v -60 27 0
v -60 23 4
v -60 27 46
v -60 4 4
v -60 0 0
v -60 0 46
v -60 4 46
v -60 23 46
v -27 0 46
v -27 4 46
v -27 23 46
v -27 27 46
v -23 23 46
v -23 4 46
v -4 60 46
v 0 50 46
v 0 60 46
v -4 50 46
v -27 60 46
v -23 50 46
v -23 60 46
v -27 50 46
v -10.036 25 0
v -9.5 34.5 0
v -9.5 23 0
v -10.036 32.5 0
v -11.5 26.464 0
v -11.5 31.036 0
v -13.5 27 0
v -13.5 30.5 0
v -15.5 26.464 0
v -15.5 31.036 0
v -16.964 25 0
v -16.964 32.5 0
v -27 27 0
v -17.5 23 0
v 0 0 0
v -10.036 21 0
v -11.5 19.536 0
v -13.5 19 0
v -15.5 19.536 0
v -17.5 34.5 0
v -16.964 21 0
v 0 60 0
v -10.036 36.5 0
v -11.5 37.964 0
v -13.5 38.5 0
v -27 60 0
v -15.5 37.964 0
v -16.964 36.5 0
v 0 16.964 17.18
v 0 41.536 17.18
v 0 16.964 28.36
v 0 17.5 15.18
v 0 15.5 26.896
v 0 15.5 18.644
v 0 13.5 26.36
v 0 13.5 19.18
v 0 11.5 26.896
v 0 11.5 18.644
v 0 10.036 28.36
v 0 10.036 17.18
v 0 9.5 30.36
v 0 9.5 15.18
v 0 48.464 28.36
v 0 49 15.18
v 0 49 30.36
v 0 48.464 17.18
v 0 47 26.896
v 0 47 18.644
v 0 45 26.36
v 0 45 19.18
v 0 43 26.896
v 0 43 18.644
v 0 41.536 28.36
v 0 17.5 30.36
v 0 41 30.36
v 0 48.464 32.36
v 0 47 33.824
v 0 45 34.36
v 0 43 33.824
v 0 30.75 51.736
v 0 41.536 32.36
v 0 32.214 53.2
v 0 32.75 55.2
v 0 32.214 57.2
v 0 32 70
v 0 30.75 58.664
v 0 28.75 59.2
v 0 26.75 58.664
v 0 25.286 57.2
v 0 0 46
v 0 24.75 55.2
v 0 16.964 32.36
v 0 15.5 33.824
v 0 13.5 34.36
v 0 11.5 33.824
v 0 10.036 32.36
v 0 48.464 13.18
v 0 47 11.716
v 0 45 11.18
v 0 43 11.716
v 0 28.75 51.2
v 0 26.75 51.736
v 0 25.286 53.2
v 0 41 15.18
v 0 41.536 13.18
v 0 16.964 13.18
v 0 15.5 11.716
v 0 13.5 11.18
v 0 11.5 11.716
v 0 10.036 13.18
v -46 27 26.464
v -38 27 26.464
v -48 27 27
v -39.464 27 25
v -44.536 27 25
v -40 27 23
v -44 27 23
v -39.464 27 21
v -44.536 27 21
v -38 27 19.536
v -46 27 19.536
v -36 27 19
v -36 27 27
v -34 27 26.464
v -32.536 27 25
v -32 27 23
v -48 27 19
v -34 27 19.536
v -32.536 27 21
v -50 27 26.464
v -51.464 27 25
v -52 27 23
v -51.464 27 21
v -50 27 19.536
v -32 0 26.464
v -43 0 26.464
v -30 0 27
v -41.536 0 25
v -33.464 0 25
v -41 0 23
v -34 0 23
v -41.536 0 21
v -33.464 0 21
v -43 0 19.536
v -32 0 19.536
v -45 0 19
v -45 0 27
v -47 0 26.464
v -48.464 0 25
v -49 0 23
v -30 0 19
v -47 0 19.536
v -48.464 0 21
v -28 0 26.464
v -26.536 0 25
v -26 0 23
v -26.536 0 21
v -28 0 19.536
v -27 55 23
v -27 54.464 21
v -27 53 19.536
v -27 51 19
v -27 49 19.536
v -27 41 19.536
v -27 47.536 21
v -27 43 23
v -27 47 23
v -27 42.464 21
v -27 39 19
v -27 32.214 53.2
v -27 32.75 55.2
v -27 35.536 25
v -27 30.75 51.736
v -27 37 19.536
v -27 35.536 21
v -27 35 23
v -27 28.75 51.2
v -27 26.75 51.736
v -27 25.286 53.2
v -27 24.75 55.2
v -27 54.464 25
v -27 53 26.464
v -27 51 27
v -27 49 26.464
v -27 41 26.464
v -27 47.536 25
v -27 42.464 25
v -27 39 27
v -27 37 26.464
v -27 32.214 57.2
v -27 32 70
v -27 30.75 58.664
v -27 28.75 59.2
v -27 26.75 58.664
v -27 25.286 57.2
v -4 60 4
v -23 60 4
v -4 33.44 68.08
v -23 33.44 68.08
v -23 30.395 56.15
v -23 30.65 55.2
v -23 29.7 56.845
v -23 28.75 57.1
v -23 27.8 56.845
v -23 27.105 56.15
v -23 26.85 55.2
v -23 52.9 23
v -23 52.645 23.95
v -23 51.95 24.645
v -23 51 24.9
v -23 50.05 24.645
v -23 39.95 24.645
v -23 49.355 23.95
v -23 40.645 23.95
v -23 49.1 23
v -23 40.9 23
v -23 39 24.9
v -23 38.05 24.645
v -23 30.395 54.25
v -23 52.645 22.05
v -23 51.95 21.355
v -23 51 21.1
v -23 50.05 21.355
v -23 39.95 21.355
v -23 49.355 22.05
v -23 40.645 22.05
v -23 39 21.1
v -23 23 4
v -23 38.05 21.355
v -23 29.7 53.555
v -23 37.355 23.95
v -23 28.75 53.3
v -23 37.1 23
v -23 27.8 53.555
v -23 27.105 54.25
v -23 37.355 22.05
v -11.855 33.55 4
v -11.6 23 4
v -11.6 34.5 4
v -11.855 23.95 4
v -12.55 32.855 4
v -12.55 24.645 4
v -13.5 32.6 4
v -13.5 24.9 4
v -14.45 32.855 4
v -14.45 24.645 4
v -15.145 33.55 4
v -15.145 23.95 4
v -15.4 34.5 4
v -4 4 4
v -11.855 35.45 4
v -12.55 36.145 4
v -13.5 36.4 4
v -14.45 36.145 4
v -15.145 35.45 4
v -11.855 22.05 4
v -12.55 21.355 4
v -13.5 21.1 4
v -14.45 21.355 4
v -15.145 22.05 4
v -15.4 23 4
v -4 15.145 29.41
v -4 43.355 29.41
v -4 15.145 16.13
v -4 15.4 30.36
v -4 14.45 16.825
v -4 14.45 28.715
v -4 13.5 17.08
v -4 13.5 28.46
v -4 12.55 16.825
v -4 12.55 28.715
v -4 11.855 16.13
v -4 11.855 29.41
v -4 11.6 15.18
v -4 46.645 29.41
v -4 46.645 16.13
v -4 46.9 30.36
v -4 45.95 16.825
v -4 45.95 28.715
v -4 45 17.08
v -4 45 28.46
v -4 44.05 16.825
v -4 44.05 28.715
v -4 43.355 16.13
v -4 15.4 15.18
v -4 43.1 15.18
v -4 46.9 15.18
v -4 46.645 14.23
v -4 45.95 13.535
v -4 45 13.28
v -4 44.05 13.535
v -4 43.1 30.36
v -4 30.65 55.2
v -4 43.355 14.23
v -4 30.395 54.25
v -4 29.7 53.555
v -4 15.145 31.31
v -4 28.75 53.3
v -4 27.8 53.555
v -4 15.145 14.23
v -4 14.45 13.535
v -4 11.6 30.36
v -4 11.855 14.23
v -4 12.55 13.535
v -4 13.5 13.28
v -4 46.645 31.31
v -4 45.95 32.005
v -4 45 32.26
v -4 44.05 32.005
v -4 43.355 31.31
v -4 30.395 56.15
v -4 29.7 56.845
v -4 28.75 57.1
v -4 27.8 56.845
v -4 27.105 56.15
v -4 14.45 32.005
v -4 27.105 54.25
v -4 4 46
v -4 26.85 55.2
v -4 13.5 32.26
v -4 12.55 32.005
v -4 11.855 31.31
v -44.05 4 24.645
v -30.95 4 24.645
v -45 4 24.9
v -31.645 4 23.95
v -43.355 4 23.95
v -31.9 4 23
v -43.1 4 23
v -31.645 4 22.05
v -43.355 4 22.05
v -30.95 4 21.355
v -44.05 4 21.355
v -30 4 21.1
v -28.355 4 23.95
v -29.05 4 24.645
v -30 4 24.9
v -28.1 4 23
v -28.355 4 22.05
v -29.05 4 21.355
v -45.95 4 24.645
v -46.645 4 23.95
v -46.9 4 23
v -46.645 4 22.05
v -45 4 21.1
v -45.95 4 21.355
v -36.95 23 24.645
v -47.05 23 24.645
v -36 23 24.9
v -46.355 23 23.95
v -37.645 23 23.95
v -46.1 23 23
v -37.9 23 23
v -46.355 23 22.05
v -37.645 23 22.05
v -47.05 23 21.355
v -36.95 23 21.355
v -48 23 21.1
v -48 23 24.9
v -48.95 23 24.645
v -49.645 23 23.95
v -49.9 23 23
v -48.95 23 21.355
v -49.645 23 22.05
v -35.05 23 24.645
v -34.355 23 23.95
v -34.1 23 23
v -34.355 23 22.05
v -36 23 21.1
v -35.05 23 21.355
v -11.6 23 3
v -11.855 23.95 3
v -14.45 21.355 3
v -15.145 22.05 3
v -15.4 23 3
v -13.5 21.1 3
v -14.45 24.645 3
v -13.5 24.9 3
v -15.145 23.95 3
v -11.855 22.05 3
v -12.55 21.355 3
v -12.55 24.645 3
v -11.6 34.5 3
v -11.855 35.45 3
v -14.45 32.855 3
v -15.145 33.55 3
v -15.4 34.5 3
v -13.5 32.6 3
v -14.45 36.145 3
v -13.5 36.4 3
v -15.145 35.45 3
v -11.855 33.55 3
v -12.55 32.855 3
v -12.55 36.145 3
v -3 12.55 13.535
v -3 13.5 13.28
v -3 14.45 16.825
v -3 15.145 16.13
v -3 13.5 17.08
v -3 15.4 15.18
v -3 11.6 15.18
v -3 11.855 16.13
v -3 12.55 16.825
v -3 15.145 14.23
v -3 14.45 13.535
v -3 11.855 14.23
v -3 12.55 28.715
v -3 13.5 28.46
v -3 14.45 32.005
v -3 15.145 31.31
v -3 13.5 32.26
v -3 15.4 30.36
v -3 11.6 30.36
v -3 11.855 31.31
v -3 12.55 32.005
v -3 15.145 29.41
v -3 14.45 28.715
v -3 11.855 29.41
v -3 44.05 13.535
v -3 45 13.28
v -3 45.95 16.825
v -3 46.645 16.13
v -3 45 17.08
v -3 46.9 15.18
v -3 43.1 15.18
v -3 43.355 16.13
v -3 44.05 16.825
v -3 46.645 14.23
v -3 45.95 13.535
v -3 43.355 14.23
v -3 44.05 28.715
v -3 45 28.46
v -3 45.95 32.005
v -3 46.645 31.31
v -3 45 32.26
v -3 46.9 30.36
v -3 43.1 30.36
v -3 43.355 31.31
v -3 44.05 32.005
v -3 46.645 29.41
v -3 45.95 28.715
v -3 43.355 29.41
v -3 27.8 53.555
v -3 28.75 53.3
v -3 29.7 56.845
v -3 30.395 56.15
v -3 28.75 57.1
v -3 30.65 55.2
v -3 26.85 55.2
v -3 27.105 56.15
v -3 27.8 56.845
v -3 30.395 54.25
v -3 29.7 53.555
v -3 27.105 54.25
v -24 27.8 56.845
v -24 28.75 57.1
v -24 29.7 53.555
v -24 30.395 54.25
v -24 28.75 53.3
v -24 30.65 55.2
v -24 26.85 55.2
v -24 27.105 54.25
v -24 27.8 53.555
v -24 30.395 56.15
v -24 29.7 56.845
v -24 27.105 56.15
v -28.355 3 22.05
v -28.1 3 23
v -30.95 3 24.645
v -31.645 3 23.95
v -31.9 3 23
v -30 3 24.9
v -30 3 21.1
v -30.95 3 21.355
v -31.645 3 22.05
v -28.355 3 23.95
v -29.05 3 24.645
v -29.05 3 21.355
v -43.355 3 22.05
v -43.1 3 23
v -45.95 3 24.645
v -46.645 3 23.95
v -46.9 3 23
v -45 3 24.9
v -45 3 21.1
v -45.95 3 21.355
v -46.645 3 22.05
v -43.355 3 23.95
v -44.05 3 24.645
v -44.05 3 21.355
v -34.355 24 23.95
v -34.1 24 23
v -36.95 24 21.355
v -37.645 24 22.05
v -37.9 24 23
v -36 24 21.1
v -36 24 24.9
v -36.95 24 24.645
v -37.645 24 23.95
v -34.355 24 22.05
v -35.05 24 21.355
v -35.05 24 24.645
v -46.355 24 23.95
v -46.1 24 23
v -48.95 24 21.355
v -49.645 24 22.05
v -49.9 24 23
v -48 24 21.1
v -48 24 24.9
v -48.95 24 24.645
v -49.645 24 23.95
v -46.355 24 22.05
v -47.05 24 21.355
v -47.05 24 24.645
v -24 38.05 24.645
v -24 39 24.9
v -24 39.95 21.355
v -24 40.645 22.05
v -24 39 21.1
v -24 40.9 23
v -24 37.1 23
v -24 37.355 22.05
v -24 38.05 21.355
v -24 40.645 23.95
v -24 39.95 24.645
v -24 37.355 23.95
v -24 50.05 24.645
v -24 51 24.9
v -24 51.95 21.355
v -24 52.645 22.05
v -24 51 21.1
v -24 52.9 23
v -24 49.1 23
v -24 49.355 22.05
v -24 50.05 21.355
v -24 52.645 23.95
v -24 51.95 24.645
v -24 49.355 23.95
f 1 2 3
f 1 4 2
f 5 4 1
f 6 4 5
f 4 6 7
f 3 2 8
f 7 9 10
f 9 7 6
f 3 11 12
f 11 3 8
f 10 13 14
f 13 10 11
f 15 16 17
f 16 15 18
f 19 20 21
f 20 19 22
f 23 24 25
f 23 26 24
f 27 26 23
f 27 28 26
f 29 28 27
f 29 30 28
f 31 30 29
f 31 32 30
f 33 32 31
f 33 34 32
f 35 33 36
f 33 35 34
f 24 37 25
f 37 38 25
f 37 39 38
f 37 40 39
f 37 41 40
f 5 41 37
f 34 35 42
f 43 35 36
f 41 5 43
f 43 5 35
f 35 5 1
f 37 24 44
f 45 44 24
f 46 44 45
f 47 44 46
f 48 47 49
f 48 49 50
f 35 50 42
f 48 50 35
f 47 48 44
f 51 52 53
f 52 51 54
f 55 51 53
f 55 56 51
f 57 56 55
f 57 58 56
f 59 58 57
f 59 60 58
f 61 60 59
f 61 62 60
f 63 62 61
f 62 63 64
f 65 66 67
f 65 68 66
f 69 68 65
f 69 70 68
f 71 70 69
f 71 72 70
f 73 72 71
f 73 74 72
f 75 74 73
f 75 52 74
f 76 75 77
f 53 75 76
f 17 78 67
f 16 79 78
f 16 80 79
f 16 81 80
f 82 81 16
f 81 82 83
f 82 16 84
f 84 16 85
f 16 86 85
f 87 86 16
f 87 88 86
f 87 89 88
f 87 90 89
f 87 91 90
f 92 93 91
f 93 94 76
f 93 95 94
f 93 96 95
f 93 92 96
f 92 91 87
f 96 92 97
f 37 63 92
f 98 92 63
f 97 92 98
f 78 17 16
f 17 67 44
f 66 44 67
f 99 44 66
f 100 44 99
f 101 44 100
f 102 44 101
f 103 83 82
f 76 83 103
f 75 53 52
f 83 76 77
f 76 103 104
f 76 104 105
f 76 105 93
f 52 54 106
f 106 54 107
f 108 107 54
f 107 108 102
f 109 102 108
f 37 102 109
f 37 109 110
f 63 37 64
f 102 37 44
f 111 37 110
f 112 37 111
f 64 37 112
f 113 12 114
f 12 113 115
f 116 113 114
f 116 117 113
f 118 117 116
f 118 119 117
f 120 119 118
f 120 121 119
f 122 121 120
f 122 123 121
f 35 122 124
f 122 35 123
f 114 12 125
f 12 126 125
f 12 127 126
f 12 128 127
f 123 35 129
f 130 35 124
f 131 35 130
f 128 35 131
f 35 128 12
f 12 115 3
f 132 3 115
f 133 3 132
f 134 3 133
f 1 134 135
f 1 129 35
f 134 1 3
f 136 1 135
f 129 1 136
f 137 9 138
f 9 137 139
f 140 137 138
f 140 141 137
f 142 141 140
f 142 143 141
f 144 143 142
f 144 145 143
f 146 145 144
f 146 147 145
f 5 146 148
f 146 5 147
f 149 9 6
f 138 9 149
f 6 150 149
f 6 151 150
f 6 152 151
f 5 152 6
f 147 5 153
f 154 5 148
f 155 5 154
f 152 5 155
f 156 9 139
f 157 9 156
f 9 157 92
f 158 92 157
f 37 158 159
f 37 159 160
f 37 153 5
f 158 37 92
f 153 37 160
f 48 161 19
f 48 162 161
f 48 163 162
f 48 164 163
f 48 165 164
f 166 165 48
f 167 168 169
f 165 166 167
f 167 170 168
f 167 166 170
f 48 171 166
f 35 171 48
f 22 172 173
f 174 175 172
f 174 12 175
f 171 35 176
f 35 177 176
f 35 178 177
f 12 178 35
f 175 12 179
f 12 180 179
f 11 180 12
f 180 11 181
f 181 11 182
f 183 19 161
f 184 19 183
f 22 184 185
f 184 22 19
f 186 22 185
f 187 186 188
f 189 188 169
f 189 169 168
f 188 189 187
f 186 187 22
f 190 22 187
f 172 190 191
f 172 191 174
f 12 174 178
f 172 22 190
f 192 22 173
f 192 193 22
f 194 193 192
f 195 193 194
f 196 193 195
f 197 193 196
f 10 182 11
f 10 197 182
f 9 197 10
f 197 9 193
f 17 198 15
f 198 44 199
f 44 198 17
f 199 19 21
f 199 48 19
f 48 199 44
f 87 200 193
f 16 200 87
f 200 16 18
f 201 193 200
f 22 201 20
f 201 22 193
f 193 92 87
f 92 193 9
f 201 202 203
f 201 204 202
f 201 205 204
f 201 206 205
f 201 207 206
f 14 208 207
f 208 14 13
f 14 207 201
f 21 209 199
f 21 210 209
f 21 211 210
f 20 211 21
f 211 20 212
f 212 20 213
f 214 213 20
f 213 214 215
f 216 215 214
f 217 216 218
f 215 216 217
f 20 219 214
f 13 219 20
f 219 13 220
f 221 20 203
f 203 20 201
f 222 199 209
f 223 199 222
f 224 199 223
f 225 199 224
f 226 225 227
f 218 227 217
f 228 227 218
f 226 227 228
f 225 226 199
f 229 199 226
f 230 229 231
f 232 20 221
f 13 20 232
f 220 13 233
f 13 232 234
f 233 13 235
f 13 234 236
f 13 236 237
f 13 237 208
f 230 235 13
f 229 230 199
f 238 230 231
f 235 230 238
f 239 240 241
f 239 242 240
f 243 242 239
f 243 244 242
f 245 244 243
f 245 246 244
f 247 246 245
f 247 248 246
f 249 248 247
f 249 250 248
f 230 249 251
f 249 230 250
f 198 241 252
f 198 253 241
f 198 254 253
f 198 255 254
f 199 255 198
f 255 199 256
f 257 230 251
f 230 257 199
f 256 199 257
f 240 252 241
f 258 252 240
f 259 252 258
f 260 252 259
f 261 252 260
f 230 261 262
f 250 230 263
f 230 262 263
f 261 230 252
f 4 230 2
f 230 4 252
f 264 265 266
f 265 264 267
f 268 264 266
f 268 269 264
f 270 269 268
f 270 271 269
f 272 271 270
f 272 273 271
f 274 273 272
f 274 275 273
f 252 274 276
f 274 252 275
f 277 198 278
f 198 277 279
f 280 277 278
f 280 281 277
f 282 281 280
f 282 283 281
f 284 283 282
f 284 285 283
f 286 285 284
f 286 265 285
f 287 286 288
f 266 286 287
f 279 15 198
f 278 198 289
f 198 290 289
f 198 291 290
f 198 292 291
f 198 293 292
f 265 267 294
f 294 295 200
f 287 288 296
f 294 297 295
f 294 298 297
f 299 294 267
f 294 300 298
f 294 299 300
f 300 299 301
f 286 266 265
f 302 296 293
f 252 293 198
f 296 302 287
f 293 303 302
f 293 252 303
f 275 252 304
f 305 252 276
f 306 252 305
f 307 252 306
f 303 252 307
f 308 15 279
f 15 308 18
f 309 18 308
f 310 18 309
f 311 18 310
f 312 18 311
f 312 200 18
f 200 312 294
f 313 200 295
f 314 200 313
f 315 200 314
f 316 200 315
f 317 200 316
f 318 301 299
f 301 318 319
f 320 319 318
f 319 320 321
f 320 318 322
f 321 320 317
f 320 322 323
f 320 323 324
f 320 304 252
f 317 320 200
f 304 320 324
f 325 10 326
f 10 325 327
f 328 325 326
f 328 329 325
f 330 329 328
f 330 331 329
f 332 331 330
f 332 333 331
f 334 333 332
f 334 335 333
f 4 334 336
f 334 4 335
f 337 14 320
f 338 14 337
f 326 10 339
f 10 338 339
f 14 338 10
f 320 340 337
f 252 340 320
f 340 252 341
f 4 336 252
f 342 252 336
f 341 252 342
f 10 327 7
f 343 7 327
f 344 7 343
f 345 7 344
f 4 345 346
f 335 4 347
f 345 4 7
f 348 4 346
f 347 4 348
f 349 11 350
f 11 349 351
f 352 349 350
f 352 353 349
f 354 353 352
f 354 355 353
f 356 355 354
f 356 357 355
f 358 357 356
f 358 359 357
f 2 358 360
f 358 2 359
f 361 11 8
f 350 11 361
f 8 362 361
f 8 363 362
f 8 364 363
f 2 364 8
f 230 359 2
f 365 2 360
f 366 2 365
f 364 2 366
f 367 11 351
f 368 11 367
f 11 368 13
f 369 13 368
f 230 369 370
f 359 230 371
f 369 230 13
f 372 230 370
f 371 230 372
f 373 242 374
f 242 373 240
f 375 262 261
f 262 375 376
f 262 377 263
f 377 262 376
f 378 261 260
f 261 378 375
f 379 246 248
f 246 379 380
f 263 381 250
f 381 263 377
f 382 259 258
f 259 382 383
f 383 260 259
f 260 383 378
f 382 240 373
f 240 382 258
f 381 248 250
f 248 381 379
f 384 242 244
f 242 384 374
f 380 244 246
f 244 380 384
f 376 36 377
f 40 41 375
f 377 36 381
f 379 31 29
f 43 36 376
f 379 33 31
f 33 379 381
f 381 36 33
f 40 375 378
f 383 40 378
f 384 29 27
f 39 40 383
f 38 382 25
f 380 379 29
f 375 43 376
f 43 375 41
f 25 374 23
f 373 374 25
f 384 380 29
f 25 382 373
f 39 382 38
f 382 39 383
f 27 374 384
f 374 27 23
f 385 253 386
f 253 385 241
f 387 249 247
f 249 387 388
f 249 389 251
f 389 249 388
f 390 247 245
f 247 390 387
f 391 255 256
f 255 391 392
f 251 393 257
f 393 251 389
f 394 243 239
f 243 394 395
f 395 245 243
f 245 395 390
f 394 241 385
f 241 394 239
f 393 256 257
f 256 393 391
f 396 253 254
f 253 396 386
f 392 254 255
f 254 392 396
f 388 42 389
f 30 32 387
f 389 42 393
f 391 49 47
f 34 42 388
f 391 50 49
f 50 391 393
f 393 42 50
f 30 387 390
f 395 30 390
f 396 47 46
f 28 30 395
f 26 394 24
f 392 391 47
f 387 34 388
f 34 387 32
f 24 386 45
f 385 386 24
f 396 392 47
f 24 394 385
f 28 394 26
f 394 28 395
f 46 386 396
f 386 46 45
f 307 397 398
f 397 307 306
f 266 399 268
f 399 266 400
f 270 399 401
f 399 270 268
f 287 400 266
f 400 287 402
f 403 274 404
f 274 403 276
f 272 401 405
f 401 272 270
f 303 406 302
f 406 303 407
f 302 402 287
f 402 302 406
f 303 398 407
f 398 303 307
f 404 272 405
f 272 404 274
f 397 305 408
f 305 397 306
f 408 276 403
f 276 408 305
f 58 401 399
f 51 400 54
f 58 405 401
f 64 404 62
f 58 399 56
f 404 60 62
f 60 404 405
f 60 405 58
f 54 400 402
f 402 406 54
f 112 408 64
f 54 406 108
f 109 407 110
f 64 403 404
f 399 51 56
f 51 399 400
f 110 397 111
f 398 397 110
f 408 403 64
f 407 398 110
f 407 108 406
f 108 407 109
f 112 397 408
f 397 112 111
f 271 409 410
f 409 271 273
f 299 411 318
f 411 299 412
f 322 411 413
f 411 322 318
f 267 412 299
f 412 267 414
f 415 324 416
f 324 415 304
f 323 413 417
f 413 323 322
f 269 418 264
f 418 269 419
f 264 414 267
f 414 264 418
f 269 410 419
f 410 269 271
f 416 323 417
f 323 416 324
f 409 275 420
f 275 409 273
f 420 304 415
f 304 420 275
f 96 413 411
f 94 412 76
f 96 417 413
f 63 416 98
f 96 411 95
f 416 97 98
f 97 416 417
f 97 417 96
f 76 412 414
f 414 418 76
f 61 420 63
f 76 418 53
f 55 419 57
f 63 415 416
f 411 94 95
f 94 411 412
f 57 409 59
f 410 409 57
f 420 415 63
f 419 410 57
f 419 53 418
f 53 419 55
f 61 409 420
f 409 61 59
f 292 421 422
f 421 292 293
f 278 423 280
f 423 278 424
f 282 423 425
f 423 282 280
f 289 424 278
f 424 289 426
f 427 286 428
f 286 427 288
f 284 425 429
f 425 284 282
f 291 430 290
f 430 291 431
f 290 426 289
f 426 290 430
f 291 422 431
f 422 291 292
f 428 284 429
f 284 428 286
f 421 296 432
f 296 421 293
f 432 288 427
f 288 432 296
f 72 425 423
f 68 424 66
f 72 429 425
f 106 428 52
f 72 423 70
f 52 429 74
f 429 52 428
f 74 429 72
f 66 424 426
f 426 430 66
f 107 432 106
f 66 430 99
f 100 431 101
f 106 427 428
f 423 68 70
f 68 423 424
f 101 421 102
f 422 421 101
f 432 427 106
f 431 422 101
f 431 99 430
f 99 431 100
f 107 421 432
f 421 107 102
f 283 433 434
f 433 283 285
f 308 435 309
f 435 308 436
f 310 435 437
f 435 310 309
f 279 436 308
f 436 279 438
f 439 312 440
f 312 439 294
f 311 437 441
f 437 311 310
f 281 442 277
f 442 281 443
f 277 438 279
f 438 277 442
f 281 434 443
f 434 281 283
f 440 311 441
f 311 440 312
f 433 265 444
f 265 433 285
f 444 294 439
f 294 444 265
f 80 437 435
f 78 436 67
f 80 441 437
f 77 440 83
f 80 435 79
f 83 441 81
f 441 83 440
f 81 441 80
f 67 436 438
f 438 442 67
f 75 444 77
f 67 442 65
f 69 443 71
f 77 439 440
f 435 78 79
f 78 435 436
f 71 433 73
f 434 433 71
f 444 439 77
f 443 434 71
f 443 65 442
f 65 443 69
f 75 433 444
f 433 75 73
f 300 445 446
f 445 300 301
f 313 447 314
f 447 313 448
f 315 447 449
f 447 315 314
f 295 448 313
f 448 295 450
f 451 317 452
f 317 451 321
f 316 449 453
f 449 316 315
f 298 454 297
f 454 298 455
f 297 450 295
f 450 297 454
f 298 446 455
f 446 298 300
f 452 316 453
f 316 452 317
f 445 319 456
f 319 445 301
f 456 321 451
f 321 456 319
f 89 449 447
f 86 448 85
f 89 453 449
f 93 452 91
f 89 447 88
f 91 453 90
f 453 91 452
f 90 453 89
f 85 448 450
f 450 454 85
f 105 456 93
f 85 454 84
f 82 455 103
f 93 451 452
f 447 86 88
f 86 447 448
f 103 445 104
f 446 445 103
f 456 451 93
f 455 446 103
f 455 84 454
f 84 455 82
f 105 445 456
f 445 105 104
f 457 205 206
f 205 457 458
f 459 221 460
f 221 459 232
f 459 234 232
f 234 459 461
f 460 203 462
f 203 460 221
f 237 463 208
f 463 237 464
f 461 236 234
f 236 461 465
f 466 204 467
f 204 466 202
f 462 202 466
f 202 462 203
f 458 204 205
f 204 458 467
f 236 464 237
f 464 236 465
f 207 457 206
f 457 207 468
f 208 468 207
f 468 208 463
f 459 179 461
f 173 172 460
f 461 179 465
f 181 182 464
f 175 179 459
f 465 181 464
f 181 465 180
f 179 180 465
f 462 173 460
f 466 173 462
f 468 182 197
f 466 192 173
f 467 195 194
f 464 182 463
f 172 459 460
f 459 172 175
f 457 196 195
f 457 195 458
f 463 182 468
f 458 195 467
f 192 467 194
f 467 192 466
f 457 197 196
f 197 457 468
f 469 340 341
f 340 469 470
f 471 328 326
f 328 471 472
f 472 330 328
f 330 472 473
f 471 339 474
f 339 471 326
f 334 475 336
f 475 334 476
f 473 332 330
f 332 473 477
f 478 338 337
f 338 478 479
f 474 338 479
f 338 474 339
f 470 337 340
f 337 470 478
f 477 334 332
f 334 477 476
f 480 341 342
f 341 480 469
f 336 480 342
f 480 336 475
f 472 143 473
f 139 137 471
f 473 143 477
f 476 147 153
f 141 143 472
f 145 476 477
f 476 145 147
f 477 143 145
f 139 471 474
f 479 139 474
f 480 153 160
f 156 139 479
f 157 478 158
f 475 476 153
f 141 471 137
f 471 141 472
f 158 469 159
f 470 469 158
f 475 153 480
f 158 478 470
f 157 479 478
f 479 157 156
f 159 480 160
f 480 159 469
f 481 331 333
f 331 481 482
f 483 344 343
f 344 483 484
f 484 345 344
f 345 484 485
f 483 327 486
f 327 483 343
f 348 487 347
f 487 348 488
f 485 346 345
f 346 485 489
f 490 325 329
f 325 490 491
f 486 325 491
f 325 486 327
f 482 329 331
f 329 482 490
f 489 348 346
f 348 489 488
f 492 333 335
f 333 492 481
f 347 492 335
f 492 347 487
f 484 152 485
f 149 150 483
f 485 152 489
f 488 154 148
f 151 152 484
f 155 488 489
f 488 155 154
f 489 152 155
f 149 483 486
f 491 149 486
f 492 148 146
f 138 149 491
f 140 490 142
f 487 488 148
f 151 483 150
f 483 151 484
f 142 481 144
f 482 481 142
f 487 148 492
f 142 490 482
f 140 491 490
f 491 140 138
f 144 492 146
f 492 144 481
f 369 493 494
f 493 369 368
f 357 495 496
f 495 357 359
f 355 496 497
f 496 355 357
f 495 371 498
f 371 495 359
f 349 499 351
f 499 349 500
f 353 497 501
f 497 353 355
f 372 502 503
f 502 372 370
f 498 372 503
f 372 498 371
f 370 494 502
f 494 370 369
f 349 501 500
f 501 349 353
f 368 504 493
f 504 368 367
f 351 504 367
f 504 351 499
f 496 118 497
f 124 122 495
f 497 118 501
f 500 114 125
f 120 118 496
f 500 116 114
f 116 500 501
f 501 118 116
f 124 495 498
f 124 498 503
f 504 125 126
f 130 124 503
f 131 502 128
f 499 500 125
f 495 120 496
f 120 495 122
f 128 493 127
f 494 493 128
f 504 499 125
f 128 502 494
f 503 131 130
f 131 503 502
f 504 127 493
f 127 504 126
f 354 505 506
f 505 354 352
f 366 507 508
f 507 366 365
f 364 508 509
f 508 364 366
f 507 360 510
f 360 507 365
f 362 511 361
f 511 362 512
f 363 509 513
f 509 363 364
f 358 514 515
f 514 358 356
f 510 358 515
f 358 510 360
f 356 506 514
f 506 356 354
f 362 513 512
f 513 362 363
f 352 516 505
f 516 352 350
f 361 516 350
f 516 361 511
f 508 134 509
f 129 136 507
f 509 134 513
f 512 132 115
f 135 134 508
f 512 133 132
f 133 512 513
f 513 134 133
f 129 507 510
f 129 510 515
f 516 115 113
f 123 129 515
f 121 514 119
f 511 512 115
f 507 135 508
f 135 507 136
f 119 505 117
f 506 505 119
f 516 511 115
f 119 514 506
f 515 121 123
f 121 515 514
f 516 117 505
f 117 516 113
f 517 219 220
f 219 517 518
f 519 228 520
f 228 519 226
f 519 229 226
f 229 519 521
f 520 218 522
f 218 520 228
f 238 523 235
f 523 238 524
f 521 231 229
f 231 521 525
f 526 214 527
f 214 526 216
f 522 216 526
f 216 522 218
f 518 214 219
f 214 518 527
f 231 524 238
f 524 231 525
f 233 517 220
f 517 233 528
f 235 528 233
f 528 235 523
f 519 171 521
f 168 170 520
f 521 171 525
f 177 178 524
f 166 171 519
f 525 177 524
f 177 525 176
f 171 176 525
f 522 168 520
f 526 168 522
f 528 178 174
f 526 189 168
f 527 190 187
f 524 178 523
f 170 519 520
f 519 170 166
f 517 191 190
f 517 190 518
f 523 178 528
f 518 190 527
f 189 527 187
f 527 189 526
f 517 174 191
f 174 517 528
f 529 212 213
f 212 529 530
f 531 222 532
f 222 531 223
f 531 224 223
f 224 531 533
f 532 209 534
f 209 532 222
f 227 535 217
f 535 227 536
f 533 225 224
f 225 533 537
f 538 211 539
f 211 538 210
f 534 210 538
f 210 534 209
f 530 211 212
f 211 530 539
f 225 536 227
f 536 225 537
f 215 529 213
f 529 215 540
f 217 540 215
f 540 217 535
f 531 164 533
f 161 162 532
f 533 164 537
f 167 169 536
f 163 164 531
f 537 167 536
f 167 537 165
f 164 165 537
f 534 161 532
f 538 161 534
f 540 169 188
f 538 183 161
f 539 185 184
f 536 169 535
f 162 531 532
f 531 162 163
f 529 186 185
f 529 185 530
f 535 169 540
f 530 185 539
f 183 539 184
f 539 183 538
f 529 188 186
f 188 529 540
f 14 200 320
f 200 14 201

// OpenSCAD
difference(){
	scale(v = [-1, 1, 1]) {
		union() {
			cube(size = [60, 27, 46]);
			cube(size = [27, 60, 46]);
			translate(v = [0, 0, 46]) {
				rotate(a = -53.1300000000, v = [1, 0, 0]) {
					translate(v = [0, 0, 0]) {
						cube(size = [27, 36, 40]);
					}
				}
			}
			translate(v = [13.5000000000, 23.0000000000, 0]) {
				rotate(a = 180, v = [1, 0, 0]) {
				}
			}
			translate(v = [13.5000000000, 34.5000000000, 0]) {
				rotate(a = 180, v = [1, 0, 0]) {
				}
			}
			translate(v = [0, 13.5000000000, 15.1800000000]) {
				rotate(a = -90, v = [0, 1, 0]) {
				}
			}
			translate(v = [0, 13.5000000000, 30.3600000000]) {
				rotate(a = -90, v = [0, 1, 0]) {
				}
			}
			translate(v = [0, 45.0000000000, 15.1800000000]) {
				rotate(a = -90, v = [0, 1, 0]) {
				}
			}
			translate(v = [0, 45.0000000000, 30.3600000000]) {
				rotate(a = -90, v = [0, 1, 0]) {
				}
			}
			translate(v = [0, 28.7500000000, 55.2000000000]) {
				rotate(a = -90, v = [0, 1, 0]) {
				}
			}
			translate(v = [27, 28.7500000000, 55.2000000000]) {
				rotate(a = 90, v = [0, 1, 0]) {
				}
			}
			translate(v = [30.0000000000, 0, 23.0000000000]) {
				rotate(a = 90, v = [1, 0, 0]) {
				}
			}
			translate(v = [45.0000000000, 0, 23.0000000000]) {
				rotate(a = 90, v = [1, 0, 0]) {
				}
			}
			translate(v = [36.0000000000, 27, 23.0000000000]) {
				rotate(a = -90, v = [1, 0, 0]) {
				}
			}
			translate(v = [48.0000000000, 27, 23.0000000000]) {
				rotate(a = -90, v = [1, 0, 0]) {
				}
			}
			translate(v = [27, 39.0000000000, 23.0000000000]) {
				rotate(a = 90, v = [0, 1, 0]) {
				}
			}
			translate(v = [27, 51.0000000000, 23.0000000000]) {
				rotate(a = 90, v = [0, 1, 0]) {
				}
			}
		}
	}
	/* Holes Below*/
	scale(v = [-1, 1, 1]){
		union(){
			translate(v = [4, 4, 4]) {
				cube(size = [19, 60, 42]);
				cube(size = [60, 19, 42]);
			}
			translate(v = [4, 4, 46]) {
				rotate(a = -53.1300000000, v = [1, 0, 0]) {
					translate(v = [0, 0, 0]) {
						cube(size = [19, 50, 38]);
					}
				}
			}
			translate(v = [13.5000000000, 23.0000000000, 0]){
				rotate(a = 180, v = [1, 0, 0]){
					union() {
						union() {
							translate(v = [0, 0, -5]) {
								cylinder($fn = 12, h = 5, r = 1.9000000000);
							}
							translate(v = [0, 0, -3]) {
								cylinder($fn = 12, h = 3, r1 = 1.9000000000, r2 = 4);
							}
						}
						cylinder($fn = 12, h = 1, r = 4);
					}
				}
			}
			translate(v = [13.5000000000, 34.5000000000, 0]){
				rotate(a = 180, v = [1, 0, 0]){
					union() {
						union() {
							translate(v = [0, 0, -5]) {
								cylinder($fn = 12, h = 5, r = 1.9000000000);
							}
							translate(v = [0, 0, -3]) {
								cylinder($fn = 12, h = 3, r1 = 1.9000000000, r2 = 4);
							}
						}
						cylinder($fn = 12, h = 1, r = 4);
					}
				}
			}
			translate(v = [0, 13.5000000000, 15.1800000000]){
				rotate(a = -90, v = [0, 1, 0]){
					union() {
						union() {
							translate(v = [0, 0, -5]) {
								cylinder($fn = 12, h = 5, r = 1.9000000000);
							}
							translate(v = [0, 0, -3]) {
								cylinder($fn = 12, h = 3, r1 = 1.9000000000, r2 = 4);
							}
						}
						cylinder($fn = 12, h = 1, r = 4);
					}
				}
			}
			translate(v = [0, 13.5000000000, 30.3600000000]){
				rotate(a = -90, v = [0, 1, 0]){
					union() {
						union() {
							translate(v = [0, 0, -5]) {
								cylinder($fn = 12, h = 5, r = 1.9000000000);
							}
							translate(v = [0, 0, -3]) {
								cylinder($fn = 12, h = 3, r1 = 1.9000000000, r2 = 4);
							}
						}
						cylinder($fn = 12, h = 1, r = 4);
					}
				}
			}
			translate(v = [0, 45.0000000000, 15.1800000000]){
				rotate(a = -90, v = [0, 1, 0]){
					union() {
						union() {
							translate(v = [0, 0, -5]) {
								cylinder($fn = 12, h = 5, r = 1.9000000000);
							}
							translate(v = [0, 0, -3]) {
								cylinder($fn = 12, h = 3, r1 = 1.9000000000, r2 = 4);
							}
						}
						cylinder($fn = 12, h = 1, r = 4);
					}
				}
			}
			translate(v = [0, 45.0000000000, 30.3600000000]){
				rotate(a = -90, v = [0, 1, 0]){
					union() {
						union() {
							translate(v = [0, 0, -5]) {
								cylinder($fn = 12, h = 5, r = 1.9000000000);
							}
							translate(v = [0, 0, -3]) {
								cylinder($fn = 12, h = 3, r1 = 1.9000000000, r2 = 4);
							}
						}
						cylinder($fn = 12, h = 1, r = 4);
					}
				}
			}
			translate(v = [0, 28.7500000000, 55.2000000000]){
				rotate(a = -90, v = [0, 1, 0]){
					union() {
						union() {
							translate(v = [0, 0, -5]) {
								cylinder($fn = 12, h = 5, r = 1.9000000000);
							}
							translate(v = [0, 0, -3]) {
								cylinder($fn = 12, h = 3, r1 = 1.9000000000, r2 = 4);
							}
						}
						cylinder($fn = 12, h = 1, r = 4);
					}
				}
			}
			translate(v = [27, 28.7500000000, 55.2000000000]){
				rotate(a = 90, v = [0, 1, 0]){
					union() {
						union() {
							translate(v = [0, 0, -5]) {
								cylinder($fn = 12, h = 5, r = 1.9000000000);
							}
							translate(v = [0, 0, -3]) {
								cylinder($fn = 12, h = 3, r1 = 1.9000000000, r2 = 4);
							}
						}
						cylinder($fn = 12, h = 1, r = 4);
					}
				}
			}
			translate(v = [30.0000000000, 0, 23.0000000000]){
				rotate(a = 90, v = [1, 0, 0]){
					union() {
						union() {
							translate(v = [0, 0, -5]) {
								cylinder($fn = 12, h = 5, r = 1.9000000000);
							}
							translate(v = [0, 0, -3]) {
								cylinder($fn = 12, h = 3, r1 = 1.9000000000, r2 = 4);
							}
						}
						cylinder($fn = 12, h = 1, r = 4);
					}
				}
			}
			translate(v = [45.0000000000, 0, 23.0000000000]){
				rotate(a = 90, v = [1, 0, 0]){
					union() {
						union() {
							translate(v = [0, 0, -5]) {
								cylinder($fn = 12, h = 5, r = 1.9000000000);
							}
							translate(v = [0, 0, -3]) {
								cylinder($fn = 12, h = 3, r1 = 1.9000000000, r2 = 4);
							}
						}
						cylinder($fn = 12, h = 1, r = 4);
					}
				}
			}
			translate(v = [36.0000000000, 27, 23.0000000000]){
				rotate(a = -90, v = [1, 0, 0]){
					union() {
						union() {
							translate(v = [0, 0, -5]) {
								cylinder($fn = 12, h = 5, r = 1.9000000000);
							}
							translate(v = [0, 0, -3]) {
								cylinder($fn = 12, h = 3, r1 = 1.9000000000, r2 = 4);
							}
						}
						cylinder($fn = 12, h = 1, r = 4);
					}
				}
			}
			translate(v = [48.0000000000, 27, 23.0000000000]){
				rotate(a = -90, v = [1, 0, 0]){
					union() {
						union() {
							translate(v = [0, 0, -5]) {
								cylinder($fn = 12, h = 5, r = 1.9000000000);
							}
							translate(v = [0, 0, -3]) {
								cylinder($fn = 12, h = 3, r1 = 1.9000000000, r2 = 4);
							}
						}
						cylinder($fn = 12, h = 1, r = 4);
					}
				}
			}
			translate(v = [27, 39.0000000000, 23.0000000000]){
				rotate(a = 90, v = [0, 1, 0]){
					union() {
						union() {
							translate(v = [0, 0, -5]) {
								cylinder($fn = 12, h = 5, r = 1.9000000000);
							}
							translate(v = [0, 0, -3]) {
								cylinder($fn = 12, h = 3, r1 = 1.9000000000, r2 = 4);
							}
						}
						cylinder($fn = 12, h = 1, r = 4);
					}
				}
			}
			translate(v = [27, 51.0000000000, 23.0000000000]){
				rotate(a = 90, v = [0, 1, 0]){
					union() {
						union() {
							translate(v = [0, 0, -5]) {
								cylinder($fn = 12, h = 5, r = 1.9000000000);
							}
							translate(v = [0, 0, -3]) {
								cylinder($fn = 12, h = 3, r1 = 1.9000000000, r2 = 4);
							}
						}
						cylinder($fn = 12, h = 1, r = 4);
					}
				}
			}
		}
	} /* End Holes */ 
}
